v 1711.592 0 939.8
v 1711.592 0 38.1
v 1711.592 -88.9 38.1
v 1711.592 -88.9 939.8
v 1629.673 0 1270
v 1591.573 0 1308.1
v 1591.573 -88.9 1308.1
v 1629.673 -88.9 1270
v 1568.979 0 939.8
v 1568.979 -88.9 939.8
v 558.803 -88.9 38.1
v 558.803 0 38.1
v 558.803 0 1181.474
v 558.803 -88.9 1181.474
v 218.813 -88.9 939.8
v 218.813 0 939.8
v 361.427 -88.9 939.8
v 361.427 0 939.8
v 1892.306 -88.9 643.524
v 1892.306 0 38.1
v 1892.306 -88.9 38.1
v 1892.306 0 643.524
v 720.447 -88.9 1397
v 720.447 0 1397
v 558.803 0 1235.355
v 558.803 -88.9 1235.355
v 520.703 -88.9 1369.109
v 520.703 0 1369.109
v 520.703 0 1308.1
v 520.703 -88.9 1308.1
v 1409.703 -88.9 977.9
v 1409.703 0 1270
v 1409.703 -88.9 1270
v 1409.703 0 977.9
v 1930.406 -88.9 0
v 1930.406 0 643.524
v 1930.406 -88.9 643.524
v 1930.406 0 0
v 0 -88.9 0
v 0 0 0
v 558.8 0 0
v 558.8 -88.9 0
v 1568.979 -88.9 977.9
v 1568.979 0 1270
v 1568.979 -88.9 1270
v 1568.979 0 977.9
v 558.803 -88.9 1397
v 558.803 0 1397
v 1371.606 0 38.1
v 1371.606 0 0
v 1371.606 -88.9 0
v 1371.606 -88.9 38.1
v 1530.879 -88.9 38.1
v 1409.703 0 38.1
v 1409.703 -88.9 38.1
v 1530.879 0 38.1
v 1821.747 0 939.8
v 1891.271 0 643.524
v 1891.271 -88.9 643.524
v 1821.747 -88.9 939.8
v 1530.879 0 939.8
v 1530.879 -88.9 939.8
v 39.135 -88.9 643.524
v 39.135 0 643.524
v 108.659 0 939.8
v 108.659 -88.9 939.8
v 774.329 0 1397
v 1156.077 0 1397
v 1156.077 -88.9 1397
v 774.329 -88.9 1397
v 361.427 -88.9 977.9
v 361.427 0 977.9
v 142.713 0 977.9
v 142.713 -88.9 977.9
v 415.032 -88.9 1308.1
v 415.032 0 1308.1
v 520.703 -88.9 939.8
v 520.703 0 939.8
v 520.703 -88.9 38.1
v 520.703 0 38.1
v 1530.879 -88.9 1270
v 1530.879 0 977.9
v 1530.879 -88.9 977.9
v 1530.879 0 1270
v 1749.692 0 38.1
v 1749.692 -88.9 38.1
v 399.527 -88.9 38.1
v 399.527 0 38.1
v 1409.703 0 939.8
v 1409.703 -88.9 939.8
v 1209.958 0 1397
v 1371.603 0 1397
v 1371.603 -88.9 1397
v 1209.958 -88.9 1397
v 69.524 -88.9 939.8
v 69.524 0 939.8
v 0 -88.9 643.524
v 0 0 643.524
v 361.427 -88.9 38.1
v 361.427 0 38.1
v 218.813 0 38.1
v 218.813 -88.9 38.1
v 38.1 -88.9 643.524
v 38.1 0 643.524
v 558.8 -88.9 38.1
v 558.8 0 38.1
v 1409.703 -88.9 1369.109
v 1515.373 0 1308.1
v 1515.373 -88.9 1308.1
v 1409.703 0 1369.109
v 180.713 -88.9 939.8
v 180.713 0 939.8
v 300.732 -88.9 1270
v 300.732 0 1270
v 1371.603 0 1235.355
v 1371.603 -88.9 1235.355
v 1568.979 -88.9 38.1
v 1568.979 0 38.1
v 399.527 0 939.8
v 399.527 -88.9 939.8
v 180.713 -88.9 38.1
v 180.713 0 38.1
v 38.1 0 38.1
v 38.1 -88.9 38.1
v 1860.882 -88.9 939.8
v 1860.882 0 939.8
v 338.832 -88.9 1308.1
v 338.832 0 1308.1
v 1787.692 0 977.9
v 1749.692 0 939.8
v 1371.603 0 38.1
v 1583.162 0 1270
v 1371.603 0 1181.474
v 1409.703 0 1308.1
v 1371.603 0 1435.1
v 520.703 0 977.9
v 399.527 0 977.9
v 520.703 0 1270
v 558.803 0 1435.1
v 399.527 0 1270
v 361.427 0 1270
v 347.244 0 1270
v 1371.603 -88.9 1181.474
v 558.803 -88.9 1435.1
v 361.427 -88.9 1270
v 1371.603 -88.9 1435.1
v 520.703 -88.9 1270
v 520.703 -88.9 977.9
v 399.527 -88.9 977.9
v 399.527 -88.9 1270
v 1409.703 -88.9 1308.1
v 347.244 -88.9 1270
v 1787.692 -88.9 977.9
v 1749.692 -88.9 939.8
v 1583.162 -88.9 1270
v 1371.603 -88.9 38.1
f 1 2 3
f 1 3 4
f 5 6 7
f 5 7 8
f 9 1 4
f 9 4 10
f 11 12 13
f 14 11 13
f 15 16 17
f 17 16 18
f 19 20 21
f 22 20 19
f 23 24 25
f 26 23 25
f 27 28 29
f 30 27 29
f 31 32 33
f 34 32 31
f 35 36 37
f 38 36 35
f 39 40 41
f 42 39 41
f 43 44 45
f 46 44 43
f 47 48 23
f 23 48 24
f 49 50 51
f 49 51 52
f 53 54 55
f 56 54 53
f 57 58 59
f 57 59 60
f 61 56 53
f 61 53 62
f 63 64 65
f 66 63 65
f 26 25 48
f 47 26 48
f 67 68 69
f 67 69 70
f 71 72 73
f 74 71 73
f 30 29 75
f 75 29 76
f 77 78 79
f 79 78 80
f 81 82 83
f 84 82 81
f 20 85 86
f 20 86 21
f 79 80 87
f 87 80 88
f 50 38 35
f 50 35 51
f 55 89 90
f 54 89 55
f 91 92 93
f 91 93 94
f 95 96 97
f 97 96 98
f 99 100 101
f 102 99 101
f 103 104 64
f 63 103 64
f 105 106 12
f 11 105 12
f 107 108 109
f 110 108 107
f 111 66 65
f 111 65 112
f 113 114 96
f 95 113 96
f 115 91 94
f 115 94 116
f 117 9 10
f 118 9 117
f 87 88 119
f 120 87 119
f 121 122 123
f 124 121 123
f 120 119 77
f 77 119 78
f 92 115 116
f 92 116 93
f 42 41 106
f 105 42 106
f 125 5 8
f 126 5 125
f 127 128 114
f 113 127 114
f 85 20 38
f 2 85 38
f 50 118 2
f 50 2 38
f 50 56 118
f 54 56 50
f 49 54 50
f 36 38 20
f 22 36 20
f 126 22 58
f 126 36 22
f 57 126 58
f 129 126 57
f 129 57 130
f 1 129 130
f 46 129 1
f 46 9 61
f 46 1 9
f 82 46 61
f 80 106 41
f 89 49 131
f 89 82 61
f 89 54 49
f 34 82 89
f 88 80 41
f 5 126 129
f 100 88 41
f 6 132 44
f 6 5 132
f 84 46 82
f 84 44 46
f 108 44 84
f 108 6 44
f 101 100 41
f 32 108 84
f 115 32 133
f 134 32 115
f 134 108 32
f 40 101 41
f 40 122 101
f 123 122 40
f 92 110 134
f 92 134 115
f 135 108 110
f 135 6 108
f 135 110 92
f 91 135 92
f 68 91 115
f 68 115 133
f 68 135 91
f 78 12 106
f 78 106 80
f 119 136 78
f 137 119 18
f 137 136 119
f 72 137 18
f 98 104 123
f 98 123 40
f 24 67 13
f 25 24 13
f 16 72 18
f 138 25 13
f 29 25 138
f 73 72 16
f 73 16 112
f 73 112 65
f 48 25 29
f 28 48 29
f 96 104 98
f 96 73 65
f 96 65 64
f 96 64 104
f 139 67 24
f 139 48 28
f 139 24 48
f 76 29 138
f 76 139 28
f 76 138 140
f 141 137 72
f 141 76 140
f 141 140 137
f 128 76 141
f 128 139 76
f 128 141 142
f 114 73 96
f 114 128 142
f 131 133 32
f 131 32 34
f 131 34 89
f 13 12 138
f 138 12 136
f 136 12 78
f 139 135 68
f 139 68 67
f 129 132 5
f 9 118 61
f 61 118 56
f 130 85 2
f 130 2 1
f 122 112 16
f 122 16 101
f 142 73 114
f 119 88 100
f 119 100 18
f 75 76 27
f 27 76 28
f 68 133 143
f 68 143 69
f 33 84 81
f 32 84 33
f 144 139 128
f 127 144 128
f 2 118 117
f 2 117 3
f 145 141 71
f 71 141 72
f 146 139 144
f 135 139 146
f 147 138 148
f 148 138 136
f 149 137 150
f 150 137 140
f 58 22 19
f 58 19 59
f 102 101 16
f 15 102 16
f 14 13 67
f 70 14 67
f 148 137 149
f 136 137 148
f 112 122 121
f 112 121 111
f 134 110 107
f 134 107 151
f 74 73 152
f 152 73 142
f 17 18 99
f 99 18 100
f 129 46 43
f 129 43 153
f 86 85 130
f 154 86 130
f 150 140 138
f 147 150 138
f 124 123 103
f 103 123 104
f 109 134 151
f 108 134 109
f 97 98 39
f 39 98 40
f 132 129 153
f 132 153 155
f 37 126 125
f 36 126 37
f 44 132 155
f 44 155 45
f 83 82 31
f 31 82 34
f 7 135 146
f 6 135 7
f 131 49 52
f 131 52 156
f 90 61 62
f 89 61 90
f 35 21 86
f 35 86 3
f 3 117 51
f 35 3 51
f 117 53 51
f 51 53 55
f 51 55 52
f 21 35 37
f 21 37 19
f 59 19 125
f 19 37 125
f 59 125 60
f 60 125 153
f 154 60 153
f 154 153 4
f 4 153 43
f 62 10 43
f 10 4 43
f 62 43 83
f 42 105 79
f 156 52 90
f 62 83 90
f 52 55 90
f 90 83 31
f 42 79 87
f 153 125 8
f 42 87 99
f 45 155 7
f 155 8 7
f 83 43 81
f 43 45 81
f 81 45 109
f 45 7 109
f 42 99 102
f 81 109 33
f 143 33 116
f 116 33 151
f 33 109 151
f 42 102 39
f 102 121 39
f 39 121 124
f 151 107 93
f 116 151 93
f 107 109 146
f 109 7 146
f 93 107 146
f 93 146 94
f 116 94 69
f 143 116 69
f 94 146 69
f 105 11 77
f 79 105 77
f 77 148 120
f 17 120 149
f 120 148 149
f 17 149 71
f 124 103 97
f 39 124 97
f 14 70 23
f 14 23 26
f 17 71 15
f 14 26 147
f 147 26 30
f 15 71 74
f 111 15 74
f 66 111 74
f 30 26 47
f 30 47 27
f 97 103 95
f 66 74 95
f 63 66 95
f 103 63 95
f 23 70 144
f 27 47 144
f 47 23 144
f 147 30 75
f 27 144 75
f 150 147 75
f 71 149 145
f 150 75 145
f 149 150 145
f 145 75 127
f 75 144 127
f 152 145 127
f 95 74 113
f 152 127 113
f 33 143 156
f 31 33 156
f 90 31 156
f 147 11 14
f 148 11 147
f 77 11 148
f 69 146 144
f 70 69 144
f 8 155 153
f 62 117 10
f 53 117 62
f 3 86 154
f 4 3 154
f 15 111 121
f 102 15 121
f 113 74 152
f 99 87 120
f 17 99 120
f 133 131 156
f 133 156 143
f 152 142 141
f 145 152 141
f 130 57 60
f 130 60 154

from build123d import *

# Parameters (mm, degrees)
F0_W     = 38.1
F0_H     = 605.4239357613
F0_H_2   = 901.7
F0_W_2   = 121.1758604333
F0_H_3   = 38.1
F1_DEPTH = 88.9


# Not quite as in the source:
# - a feature names something its author has since deleted; it is built from what else it names


with BuildPart() as f1:
    # F0 (on Front) → F1 (new body)
    with BuildSketch(Plane.XZ):
        Polygon((0, 38.1), (0, 0), (558.8, 0), (558.8, 38.1), (520.7027813, 38.1), (399.5269208667, 38.1), (361.4269208667, 38.1), (218.8134604333, 38.1), (180.7134604333, 38.1), (38.1, 38.1), align=None)
        with Locations((19.05, 340.8119678807)):
            Rectangle(F0_W, F0_H)
        Polygon((520.7027813, 38.1), (558.8, 38.1), (558.8027813, 38.1), (558.8027813, 939.8), (558.8027813, 1181.4738530943), (558.8027813, 1235.3553898208), (558.8027813, 1270), (520.7027813, 1270), (520.7027813, 977.9), (520.7027813, 939.8), align=None)
        Polygon((69.5237996219, 939.8), (0, 643.5239357613), (38.1, 643.5239357613), (39.1349278428, 643.5239357613), (108.6587274647, 939.8), align=None)
        with Locations((199.7634604333, 488.95)):
            Rectangle(F0_W, F0_H_2)
        Polygon((96.2017068277, 977.9), (69.5237996219, 939.8), (108.6587274647, 939.8), (180.7134604333, 939.8), (218.8134604333, 939.8), (361.4269208667, 939.8), (361.4269208667, 977.9), (142.7132186595, 977.9), align=None)
        Polygon((361.4269208667, 38.1), (399.5269208667, 38.1), (399.5269208667, 939.8), (399.5269208667, 977.9), (399.5269208667, 1270), (361.4269208667, 1270), (361.4269208667, 977.9), (361.4269208667, 939.8), align=None)
        with Locations((460.1148510833, 958.85)):
            Rectangle(F0_W_2, F0_H_3)
        Polygon((300.7323287388, 1270), (96.2017068277, 977.9), (142.7132186595, 977.9), (347.2438405706, 1270), align=None)
        Polygon((558.8027813, 1235.3553898208), (558.8027813, 1181.4738530943), (774.3289282057, 1397), (720.4473914792, 1397), align=None)
        Polygon((338.8323287388, 1308.1), (300.7323287388, 1270), (347.2438405706, 1270), (361.4269208667, 1270), (399.5269208667, 1270), (520.7027813, 1270), (558.8027813, 1270), (558.8027813, 1308.1), (520.7027813, 1308.1), (415.0323287388, 1308.1), (339.9874666667, 1308.1), align=None)
        Polygon((720.4473914792, 1397), (774.3289282057, 1397), (965.2027813, 1397), (965.2027813, 1435.1), (558.8027813, 1435.1), (558.8027813, 1397), align=None)
        Polygon((558.8027813, 1435.1), (338.8323287388, 1308.1), (339.9874666667, 1308.1), (415.0323287388, 1308.1), (520.7027813, 1369.1088642316), (558.8027813, 1391.1059094878), (558.8027813, 1397), align=None)
        Polygon((520.7027813, 1308.1), (558.8027813, 1308.1), (558.8027813, 1391.1059094878), (520.7027813, 1369.1088642316), align=None)
    extrude(amount=F1_DEPTH)

    # F2: F1 across face


with BuildPart() as f1_1:
    add(f1.part)
    add(f1.part.mirror(Plane(origin=(965.2027813, -44.45, 1416.05), x_dir=(0, 1, 0), z_dir=(1, 0, 0))))


solid = f1_1.part
